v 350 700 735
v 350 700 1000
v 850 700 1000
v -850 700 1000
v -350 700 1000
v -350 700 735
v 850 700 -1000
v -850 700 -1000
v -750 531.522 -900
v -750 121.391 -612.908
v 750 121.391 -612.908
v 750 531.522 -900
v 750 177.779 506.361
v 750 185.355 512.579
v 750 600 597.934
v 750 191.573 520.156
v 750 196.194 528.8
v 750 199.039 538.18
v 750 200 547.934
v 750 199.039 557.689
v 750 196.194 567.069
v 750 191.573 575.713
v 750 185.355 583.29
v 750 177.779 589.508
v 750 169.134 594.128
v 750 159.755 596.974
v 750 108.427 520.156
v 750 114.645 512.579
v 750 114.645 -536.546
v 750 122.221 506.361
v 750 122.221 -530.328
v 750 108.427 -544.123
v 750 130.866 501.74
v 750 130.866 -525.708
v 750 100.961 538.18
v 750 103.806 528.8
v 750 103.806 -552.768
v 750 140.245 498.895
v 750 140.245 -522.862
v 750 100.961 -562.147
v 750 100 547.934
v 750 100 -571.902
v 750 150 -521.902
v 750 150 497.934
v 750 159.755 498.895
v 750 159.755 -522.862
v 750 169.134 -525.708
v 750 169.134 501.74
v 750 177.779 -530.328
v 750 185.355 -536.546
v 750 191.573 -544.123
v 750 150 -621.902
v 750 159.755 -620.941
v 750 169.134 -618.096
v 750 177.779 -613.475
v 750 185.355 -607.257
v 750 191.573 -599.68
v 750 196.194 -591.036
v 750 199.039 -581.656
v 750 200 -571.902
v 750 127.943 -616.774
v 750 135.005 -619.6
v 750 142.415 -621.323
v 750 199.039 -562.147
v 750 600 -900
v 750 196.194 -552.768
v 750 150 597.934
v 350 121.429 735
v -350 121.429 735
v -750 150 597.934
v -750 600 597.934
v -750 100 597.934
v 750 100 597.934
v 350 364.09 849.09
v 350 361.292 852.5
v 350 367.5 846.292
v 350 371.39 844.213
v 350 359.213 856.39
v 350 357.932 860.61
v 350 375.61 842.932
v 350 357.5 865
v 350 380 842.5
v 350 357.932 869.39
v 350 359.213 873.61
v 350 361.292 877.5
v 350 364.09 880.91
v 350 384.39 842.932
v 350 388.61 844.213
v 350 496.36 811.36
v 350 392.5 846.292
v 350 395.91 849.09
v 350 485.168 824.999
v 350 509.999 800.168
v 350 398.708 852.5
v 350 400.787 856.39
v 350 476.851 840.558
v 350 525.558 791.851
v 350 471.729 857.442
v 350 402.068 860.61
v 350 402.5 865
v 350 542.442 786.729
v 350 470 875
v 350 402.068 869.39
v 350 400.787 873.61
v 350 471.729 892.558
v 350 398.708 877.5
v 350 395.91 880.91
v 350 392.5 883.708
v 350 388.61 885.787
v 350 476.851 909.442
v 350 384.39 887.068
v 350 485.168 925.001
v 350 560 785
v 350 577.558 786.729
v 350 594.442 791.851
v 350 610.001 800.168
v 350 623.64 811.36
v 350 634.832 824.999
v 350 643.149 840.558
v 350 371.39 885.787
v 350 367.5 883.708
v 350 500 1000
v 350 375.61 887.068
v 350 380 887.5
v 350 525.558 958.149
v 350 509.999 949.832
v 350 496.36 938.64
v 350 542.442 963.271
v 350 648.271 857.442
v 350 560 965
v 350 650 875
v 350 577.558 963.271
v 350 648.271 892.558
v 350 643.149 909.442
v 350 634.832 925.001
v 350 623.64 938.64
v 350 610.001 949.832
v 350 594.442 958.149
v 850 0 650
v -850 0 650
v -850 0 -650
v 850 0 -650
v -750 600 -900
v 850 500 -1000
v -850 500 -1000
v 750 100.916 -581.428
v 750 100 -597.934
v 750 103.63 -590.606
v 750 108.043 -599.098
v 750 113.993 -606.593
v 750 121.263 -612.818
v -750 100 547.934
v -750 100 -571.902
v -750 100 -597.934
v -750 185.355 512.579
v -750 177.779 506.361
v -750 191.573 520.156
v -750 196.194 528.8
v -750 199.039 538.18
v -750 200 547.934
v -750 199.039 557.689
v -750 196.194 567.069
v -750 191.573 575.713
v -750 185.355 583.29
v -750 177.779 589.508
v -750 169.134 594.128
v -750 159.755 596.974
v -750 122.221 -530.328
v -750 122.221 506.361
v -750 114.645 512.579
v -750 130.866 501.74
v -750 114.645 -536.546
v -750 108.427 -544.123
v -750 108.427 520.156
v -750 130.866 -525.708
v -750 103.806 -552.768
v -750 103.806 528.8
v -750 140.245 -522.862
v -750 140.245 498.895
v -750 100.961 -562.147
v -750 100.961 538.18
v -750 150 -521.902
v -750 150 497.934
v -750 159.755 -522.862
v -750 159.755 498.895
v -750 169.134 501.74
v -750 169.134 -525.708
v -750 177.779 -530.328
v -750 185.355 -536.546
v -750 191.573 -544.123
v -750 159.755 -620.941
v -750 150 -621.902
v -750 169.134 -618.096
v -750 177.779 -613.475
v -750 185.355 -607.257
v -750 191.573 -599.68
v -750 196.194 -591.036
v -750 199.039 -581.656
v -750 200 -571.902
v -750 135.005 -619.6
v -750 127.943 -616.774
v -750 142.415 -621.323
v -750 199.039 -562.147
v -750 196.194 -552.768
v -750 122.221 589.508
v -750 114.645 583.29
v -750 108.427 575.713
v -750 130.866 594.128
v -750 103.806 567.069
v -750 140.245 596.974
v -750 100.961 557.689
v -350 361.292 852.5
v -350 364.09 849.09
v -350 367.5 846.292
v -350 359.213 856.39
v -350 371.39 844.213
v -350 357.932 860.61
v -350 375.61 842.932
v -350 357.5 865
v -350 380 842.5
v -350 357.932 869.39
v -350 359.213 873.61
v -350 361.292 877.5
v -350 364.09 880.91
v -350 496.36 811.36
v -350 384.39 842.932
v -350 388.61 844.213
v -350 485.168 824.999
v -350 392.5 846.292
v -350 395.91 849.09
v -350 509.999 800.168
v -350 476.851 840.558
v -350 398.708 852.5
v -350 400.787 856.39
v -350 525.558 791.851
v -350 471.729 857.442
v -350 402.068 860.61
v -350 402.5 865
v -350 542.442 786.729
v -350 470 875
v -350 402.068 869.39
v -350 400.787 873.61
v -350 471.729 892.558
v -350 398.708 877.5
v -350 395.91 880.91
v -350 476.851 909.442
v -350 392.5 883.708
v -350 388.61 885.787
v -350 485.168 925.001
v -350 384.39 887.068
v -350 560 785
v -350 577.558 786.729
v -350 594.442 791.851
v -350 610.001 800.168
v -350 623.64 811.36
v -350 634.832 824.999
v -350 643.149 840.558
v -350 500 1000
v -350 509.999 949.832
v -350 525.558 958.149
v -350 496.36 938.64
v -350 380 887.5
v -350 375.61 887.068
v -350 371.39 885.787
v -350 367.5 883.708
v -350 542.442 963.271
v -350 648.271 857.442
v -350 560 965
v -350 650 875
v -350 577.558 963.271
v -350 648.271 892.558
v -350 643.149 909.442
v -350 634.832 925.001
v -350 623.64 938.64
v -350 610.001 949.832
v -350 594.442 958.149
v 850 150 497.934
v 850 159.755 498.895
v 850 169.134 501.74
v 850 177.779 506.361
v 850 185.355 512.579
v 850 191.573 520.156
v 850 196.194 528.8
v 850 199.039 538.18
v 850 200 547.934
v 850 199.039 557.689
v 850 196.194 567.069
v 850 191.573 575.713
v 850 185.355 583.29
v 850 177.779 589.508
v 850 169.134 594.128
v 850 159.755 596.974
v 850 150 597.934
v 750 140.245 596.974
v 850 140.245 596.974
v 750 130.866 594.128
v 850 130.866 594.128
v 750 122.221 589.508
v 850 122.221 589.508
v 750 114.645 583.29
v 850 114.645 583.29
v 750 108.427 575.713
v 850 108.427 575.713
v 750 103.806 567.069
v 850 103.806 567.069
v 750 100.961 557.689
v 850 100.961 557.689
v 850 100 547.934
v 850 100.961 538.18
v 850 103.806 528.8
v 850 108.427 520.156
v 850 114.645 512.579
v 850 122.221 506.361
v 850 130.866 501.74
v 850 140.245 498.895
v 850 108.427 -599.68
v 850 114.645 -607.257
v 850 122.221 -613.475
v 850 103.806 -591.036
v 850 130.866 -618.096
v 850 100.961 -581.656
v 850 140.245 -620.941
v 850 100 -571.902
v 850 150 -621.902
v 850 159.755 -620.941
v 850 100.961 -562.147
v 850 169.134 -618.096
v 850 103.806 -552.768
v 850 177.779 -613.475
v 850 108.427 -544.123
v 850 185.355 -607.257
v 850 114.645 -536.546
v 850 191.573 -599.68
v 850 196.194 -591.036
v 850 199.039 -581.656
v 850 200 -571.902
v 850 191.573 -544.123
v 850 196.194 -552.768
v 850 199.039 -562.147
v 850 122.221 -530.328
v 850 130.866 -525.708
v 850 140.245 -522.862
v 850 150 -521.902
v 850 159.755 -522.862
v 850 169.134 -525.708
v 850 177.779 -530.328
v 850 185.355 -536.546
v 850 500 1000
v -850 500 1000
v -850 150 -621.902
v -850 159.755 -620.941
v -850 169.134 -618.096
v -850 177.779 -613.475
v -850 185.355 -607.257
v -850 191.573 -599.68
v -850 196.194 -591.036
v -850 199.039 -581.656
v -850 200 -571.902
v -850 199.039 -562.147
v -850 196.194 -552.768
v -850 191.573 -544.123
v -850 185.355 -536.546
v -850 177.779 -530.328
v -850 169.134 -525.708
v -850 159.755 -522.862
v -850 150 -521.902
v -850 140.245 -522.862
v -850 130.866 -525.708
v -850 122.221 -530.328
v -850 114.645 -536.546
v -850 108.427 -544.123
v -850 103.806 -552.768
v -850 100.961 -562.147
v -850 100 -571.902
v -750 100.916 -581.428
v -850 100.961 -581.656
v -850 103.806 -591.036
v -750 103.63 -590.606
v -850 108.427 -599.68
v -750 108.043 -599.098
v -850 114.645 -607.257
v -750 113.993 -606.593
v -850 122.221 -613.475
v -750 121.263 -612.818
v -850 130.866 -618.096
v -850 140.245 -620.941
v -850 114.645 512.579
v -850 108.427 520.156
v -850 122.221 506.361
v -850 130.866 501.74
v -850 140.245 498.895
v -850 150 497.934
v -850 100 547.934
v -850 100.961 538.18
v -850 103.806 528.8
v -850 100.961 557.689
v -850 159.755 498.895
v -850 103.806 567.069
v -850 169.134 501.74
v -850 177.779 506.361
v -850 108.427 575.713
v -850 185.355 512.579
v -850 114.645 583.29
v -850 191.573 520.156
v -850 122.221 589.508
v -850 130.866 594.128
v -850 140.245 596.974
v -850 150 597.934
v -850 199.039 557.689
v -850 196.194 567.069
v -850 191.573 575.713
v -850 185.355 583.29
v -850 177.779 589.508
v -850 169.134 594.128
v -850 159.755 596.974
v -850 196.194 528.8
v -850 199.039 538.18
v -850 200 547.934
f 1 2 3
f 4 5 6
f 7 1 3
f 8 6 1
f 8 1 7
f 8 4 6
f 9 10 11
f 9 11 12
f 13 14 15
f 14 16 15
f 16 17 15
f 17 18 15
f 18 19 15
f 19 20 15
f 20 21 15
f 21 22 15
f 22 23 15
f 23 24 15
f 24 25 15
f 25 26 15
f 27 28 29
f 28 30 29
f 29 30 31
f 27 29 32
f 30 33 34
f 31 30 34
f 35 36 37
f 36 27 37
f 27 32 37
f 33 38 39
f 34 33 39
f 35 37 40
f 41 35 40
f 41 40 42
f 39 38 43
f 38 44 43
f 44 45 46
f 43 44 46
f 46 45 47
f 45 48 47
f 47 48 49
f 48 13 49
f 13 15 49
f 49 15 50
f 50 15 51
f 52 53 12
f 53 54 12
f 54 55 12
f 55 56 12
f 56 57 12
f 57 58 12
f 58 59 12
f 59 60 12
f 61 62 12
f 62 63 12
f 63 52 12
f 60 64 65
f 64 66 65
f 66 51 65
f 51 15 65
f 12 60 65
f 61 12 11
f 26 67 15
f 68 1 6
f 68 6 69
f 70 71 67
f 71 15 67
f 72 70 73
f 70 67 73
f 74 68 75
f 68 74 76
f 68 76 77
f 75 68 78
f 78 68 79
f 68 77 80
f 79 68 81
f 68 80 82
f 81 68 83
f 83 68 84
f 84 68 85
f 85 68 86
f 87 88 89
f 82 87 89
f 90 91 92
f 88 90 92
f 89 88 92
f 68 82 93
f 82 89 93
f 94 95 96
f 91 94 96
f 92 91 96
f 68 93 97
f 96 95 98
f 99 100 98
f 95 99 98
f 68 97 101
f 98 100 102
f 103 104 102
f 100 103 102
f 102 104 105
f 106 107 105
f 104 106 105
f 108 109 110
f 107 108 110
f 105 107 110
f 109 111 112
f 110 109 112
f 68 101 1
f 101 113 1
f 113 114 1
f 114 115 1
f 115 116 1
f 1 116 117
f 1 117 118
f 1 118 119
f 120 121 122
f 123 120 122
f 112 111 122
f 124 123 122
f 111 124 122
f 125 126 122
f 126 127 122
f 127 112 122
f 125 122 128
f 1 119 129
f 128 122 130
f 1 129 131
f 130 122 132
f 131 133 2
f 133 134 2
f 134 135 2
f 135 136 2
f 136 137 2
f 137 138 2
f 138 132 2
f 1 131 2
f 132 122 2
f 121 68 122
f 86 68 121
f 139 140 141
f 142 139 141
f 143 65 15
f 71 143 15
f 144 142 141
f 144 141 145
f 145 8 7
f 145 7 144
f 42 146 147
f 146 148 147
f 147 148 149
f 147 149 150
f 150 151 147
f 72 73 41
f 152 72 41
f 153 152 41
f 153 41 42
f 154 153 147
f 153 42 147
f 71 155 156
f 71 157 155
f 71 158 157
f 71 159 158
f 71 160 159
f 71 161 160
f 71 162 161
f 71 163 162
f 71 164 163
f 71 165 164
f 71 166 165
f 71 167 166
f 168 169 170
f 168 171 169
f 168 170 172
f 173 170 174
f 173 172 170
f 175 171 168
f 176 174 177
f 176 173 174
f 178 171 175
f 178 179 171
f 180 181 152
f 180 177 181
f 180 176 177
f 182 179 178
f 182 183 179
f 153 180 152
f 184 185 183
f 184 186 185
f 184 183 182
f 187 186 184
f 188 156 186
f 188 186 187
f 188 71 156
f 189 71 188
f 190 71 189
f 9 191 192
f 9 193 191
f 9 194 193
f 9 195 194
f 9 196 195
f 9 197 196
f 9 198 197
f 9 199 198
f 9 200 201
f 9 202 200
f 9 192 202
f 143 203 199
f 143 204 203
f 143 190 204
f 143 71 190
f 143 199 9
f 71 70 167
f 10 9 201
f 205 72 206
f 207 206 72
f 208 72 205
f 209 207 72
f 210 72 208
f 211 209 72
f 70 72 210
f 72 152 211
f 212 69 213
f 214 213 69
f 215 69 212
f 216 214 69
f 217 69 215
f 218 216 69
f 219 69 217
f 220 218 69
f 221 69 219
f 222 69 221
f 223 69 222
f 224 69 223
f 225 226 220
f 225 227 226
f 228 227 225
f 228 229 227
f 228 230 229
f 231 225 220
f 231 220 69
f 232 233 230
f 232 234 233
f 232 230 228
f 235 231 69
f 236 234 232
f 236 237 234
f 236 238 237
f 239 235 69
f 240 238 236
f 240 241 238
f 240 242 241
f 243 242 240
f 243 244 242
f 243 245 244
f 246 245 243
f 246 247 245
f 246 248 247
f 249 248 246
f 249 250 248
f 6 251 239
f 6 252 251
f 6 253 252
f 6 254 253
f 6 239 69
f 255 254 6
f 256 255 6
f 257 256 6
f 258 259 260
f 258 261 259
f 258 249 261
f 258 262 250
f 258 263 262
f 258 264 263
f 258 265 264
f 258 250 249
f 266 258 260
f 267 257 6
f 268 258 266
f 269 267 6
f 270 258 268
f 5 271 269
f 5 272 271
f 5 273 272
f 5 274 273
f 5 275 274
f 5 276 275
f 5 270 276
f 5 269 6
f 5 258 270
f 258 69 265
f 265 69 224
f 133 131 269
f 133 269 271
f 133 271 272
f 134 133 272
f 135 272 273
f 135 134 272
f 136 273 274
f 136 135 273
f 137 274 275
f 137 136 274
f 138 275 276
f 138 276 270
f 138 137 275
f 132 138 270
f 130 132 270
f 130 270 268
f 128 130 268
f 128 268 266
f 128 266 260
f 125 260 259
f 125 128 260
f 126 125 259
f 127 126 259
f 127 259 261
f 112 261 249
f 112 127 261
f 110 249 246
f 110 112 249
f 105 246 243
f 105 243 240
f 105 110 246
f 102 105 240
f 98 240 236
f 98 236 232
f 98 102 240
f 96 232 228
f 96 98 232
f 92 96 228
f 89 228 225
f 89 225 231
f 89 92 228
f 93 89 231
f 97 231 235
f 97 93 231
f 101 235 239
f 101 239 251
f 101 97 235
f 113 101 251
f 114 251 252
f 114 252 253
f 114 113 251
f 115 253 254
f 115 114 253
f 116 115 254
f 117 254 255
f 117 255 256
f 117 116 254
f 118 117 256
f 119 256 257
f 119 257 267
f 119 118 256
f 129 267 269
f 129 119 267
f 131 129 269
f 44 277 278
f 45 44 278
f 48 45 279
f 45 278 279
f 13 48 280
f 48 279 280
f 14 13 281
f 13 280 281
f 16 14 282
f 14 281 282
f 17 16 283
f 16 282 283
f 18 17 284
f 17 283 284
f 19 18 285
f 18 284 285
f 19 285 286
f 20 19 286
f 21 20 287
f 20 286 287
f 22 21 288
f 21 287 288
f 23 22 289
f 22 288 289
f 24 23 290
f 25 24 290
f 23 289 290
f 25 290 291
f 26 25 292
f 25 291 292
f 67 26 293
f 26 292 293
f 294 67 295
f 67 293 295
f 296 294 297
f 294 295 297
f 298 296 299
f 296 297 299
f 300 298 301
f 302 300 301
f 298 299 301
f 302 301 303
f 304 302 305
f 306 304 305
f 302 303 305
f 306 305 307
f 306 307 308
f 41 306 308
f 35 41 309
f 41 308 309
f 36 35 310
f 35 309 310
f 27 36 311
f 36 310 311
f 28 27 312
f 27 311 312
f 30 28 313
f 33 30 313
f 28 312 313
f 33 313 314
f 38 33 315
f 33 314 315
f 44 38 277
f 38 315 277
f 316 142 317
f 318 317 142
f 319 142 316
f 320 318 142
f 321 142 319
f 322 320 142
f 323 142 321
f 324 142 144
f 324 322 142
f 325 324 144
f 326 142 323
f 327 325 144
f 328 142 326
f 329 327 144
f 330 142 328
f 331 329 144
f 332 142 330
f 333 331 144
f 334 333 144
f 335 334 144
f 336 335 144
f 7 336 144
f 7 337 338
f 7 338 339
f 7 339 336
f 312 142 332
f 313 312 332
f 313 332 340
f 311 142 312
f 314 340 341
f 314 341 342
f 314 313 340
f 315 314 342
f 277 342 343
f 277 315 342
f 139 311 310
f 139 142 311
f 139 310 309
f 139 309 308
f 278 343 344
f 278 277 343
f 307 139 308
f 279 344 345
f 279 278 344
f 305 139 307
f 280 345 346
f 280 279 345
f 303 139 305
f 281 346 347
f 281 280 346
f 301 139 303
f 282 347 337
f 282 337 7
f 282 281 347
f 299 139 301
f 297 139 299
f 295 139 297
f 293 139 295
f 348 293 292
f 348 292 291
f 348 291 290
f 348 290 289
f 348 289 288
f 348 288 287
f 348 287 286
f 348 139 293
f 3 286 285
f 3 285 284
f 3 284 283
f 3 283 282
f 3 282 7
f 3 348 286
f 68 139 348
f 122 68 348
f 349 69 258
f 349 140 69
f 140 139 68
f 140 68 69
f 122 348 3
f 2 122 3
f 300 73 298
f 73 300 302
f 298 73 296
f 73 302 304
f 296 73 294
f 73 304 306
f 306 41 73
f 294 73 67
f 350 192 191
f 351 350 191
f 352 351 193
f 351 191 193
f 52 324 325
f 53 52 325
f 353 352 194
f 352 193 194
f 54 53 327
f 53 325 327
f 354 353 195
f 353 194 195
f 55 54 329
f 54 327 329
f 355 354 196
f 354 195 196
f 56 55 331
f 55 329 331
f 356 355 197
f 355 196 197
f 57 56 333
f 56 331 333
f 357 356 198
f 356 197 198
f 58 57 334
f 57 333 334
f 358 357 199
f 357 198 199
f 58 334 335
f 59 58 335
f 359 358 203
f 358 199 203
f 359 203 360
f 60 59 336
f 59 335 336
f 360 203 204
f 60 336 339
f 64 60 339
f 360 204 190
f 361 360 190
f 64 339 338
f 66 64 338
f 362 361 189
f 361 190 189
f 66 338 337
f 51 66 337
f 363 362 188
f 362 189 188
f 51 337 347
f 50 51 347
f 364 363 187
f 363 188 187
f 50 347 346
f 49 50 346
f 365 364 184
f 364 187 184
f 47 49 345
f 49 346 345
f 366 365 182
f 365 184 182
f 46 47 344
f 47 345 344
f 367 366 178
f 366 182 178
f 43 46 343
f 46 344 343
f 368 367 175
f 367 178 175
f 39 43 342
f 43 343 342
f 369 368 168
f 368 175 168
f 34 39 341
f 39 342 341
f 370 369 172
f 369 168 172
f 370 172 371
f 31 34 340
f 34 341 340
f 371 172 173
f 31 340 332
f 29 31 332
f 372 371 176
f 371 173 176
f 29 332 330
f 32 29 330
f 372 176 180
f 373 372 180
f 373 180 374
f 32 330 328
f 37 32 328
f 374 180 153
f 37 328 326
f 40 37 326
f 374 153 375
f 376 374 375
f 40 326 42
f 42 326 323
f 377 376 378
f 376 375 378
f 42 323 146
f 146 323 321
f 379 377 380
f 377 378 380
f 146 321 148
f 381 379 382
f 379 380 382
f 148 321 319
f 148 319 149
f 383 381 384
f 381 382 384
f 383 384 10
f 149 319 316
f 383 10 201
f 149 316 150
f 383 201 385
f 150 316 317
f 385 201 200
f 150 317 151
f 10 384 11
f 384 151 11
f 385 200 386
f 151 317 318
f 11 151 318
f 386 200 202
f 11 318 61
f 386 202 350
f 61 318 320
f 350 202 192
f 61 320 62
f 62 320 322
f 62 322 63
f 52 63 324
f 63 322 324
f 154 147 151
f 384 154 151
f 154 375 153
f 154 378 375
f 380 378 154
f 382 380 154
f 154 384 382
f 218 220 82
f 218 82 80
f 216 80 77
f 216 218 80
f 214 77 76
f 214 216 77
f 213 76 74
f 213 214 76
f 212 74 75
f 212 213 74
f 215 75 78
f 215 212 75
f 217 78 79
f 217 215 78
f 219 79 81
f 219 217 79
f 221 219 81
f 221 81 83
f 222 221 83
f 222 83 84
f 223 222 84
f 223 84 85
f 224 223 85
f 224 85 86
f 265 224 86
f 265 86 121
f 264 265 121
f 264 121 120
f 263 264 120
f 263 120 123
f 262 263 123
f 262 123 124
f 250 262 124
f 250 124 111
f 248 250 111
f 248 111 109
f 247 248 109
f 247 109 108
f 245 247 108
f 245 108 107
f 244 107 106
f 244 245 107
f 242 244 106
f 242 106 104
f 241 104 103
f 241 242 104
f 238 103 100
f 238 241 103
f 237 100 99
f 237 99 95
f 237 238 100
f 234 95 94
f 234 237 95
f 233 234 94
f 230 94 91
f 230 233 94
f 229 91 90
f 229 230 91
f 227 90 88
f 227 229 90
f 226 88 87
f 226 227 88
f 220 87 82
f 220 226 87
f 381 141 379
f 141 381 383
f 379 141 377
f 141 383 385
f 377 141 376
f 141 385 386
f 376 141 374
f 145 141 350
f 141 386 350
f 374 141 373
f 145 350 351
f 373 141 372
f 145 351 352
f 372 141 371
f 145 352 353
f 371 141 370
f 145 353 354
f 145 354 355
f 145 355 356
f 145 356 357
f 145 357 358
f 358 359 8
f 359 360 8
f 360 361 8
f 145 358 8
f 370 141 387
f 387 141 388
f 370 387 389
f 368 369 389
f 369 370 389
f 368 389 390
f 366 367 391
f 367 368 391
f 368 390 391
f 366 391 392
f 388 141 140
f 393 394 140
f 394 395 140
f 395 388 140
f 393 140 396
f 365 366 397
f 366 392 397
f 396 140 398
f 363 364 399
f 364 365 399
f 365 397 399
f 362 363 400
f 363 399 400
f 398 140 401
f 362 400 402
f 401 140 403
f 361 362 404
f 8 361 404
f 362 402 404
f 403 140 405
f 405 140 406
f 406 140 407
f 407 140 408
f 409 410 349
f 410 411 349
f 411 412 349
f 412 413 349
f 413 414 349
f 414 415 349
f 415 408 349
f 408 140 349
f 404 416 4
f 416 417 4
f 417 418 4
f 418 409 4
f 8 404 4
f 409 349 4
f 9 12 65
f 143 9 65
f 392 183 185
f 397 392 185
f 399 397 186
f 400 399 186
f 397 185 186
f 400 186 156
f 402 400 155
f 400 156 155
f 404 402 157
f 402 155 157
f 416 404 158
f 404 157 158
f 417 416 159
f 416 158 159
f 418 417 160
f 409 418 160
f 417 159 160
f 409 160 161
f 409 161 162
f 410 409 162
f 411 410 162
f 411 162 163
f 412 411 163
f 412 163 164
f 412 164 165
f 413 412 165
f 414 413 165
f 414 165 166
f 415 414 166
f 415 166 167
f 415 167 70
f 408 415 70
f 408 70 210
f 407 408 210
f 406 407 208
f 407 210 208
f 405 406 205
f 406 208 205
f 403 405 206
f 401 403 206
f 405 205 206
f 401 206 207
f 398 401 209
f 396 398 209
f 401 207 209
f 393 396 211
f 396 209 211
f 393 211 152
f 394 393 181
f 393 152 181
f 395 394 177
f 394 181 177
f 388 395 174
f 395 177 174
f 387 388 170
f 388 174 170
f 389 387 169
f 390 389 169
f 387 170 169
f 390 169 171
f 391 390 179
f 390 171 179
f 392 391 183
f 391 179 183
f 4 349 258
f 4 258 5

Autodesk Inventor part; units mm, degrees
ref_plane "YZ Plane" through (0, 0, 0) normal (1, 0, 0) x (0, 1, 0)
ref_plane "XZ Plane" through (0, 0, 0) normal (0, 1, 0) x (-1, 0, 0)
sketch "草圖1" plane through (0, 0, 0) normal (1, 0, 0) x (0, 1, 0)
  line L0 (500, 1000) -> (500, -1000)
  line L1 (0, 650) -> (0, -650)
  line L2 (0, -650) -> (500, -1000)
  line L3 (0, 650) -> (500, 1000)
  line L4 (500, 1000) -> (700, 1000)
  line L5 (700, 1000) -> (700, -1000)
  line L6 (700, -1000) -> (500, -1000)
  line L7 (500, -1000) -> (500, 1000)
  circle A0 centre (560, 875) radius 90
  line L8 (785.0874, 735) -> (28.1159, 735)
  point P0 (0, 0)
  point P1 (0, 0)
  point P2 (500, 0)
  point P3 (700, 735)
  point P4 (560, 785)
  point P5 (121.4286, 735)
  point P6 (500, 735)
  point P7 (500, 807.918)
  point P8 (500, 942.082)
  dimension "d0" = 1300
  dimension "d1" = 2000
  dimension "d2" = 500
  dimension "d3" = 200
  dimension "d6" = 180
  dimension "d7" = 140
  dimension "d8" = 125
  dimension "d32" = 265
extrude "擠出1" add sketch "草圖1" along normal mid plane 1700 contours A0 L0 | L0 A0 | L8 L0 L2 L1 L3 | L8 L5 L6 L0
extrude "擠出2" add sketch "草圖1" against normal blind 500 from surface at 850 contours L4 L5 L8 L0 A0 | L0 A0 L8 L3 | A0 L0 | L0 A0 | L8 L0 L2 L1 L3
extrude "擠出3" add sketch "草圖1" along normal blind 500 from surface at -850 contours L4 L5 L8 L0 A0 | L0 A0 L8 L3 | A0 L0 | L0 A0 | L8 L0 L2 L1 L3
sketch "草圖2" plane through (-350, 560, 875) normal (1, 0, 0) x (0, 0, -1)
  circle A0 centre (10, -180) radius 22.5
  line L0 (140, -438.5714) -> (140, 140) projected
  line L1 (-125, 140) -> (140, 140) projected
  line L2 (-125, -60) -> (-125, 140) projected
  line L3 (140, -438.5714) -> (-125, -60) projected
  line L4 (225, -560) -> (140, -438.5714) projected
  line L5 (1525, -560) -> (225, -560) projected
  line L6 (1875, -60) -> (1525, -560) projected
  line L7 (1875, 140) -> (1875, -60) projected
  line L8 (140, 140) -> (1875, 140) projected
  circle A1 centre (0, 0) radius 90 projected
  point P0 (875, -560)
  dimension "d13" = 45
  dimension "d15" = 320
extrude "擠出4" add sketch "草圖2" along normal up to next contours A0
ref_plane "工作平面1" through (750, 0, 0) normal (1, 0, 0) x (0, 0, -1)
sketch "草圖4" plane through (750, 0, 0) normal (1, 0, 0) x (0, 0, -1)
  line L0 (-1000, 700) -> (1000, 700) projected
  line L1 (1000, 700) -> (1000, 500) projected
  line L2 (1000, 500) -> (650, 0) projected
  line L3 (650, 0) -> (-650, 0) projected
  line L4 (-650, 0) -> (-1000, 500) projected
  line L5 (-1000, 500) -> (-1000, 700) projected
  line L6 (597.9344, 100) -> (900, 531.5222)
  line L7 (900, 531.5222) -> (900, 600)
  line L8 (900, 600) -> (-900, 600)
  line L9 (-900, 600) -> (-900, 531.5222)
  line L10 (-900, 531.5222) -> (-597.9344, 100)
  line L11 (-597.9344, 100) -> (597.9344, 100)
  line L12 (-597.9344, 1100.1132) -> (-597.9344, -380.0313)
  point P0 (0, 0)
  point P1 (-597.9344, 600)
  dimension "d20" = 100
extrude "擠出5" cut sketch "草圖4" against normal blind 1500 contours L8 L7 L6 L11 L12
sketch "草圖5" plane through (850, 0, 0) normal (1, 0, 0) x (0, 0, -1)
  circle A0 centre (-547.9344, 150) radius 50
  circle A1 centre (571.9017, 150) radius 50
  line L0 (-650, 0) -> (650, 0) projected
  line L1 (-597.9344, 600) -> (-597.9344, 100) projected
  line L2 (-597.9344, 100) -> (597.9344, 100) projected
  line L3 (597.9344, 100) -> (900, 531.5222) projected
  point P0 (0, 0)
  dimension "d24" = 100
  dimension "d25" = 100
extrude "擠出6" cut sketch "草圖5" against normal through all contours A0 | A1
thread "螺紋2" size "1 13/16-6 UN" class "2A" standard "ANSI Unified Screw Threads" full length
equation "\"d25\" = d24"
properties part number "車身"
